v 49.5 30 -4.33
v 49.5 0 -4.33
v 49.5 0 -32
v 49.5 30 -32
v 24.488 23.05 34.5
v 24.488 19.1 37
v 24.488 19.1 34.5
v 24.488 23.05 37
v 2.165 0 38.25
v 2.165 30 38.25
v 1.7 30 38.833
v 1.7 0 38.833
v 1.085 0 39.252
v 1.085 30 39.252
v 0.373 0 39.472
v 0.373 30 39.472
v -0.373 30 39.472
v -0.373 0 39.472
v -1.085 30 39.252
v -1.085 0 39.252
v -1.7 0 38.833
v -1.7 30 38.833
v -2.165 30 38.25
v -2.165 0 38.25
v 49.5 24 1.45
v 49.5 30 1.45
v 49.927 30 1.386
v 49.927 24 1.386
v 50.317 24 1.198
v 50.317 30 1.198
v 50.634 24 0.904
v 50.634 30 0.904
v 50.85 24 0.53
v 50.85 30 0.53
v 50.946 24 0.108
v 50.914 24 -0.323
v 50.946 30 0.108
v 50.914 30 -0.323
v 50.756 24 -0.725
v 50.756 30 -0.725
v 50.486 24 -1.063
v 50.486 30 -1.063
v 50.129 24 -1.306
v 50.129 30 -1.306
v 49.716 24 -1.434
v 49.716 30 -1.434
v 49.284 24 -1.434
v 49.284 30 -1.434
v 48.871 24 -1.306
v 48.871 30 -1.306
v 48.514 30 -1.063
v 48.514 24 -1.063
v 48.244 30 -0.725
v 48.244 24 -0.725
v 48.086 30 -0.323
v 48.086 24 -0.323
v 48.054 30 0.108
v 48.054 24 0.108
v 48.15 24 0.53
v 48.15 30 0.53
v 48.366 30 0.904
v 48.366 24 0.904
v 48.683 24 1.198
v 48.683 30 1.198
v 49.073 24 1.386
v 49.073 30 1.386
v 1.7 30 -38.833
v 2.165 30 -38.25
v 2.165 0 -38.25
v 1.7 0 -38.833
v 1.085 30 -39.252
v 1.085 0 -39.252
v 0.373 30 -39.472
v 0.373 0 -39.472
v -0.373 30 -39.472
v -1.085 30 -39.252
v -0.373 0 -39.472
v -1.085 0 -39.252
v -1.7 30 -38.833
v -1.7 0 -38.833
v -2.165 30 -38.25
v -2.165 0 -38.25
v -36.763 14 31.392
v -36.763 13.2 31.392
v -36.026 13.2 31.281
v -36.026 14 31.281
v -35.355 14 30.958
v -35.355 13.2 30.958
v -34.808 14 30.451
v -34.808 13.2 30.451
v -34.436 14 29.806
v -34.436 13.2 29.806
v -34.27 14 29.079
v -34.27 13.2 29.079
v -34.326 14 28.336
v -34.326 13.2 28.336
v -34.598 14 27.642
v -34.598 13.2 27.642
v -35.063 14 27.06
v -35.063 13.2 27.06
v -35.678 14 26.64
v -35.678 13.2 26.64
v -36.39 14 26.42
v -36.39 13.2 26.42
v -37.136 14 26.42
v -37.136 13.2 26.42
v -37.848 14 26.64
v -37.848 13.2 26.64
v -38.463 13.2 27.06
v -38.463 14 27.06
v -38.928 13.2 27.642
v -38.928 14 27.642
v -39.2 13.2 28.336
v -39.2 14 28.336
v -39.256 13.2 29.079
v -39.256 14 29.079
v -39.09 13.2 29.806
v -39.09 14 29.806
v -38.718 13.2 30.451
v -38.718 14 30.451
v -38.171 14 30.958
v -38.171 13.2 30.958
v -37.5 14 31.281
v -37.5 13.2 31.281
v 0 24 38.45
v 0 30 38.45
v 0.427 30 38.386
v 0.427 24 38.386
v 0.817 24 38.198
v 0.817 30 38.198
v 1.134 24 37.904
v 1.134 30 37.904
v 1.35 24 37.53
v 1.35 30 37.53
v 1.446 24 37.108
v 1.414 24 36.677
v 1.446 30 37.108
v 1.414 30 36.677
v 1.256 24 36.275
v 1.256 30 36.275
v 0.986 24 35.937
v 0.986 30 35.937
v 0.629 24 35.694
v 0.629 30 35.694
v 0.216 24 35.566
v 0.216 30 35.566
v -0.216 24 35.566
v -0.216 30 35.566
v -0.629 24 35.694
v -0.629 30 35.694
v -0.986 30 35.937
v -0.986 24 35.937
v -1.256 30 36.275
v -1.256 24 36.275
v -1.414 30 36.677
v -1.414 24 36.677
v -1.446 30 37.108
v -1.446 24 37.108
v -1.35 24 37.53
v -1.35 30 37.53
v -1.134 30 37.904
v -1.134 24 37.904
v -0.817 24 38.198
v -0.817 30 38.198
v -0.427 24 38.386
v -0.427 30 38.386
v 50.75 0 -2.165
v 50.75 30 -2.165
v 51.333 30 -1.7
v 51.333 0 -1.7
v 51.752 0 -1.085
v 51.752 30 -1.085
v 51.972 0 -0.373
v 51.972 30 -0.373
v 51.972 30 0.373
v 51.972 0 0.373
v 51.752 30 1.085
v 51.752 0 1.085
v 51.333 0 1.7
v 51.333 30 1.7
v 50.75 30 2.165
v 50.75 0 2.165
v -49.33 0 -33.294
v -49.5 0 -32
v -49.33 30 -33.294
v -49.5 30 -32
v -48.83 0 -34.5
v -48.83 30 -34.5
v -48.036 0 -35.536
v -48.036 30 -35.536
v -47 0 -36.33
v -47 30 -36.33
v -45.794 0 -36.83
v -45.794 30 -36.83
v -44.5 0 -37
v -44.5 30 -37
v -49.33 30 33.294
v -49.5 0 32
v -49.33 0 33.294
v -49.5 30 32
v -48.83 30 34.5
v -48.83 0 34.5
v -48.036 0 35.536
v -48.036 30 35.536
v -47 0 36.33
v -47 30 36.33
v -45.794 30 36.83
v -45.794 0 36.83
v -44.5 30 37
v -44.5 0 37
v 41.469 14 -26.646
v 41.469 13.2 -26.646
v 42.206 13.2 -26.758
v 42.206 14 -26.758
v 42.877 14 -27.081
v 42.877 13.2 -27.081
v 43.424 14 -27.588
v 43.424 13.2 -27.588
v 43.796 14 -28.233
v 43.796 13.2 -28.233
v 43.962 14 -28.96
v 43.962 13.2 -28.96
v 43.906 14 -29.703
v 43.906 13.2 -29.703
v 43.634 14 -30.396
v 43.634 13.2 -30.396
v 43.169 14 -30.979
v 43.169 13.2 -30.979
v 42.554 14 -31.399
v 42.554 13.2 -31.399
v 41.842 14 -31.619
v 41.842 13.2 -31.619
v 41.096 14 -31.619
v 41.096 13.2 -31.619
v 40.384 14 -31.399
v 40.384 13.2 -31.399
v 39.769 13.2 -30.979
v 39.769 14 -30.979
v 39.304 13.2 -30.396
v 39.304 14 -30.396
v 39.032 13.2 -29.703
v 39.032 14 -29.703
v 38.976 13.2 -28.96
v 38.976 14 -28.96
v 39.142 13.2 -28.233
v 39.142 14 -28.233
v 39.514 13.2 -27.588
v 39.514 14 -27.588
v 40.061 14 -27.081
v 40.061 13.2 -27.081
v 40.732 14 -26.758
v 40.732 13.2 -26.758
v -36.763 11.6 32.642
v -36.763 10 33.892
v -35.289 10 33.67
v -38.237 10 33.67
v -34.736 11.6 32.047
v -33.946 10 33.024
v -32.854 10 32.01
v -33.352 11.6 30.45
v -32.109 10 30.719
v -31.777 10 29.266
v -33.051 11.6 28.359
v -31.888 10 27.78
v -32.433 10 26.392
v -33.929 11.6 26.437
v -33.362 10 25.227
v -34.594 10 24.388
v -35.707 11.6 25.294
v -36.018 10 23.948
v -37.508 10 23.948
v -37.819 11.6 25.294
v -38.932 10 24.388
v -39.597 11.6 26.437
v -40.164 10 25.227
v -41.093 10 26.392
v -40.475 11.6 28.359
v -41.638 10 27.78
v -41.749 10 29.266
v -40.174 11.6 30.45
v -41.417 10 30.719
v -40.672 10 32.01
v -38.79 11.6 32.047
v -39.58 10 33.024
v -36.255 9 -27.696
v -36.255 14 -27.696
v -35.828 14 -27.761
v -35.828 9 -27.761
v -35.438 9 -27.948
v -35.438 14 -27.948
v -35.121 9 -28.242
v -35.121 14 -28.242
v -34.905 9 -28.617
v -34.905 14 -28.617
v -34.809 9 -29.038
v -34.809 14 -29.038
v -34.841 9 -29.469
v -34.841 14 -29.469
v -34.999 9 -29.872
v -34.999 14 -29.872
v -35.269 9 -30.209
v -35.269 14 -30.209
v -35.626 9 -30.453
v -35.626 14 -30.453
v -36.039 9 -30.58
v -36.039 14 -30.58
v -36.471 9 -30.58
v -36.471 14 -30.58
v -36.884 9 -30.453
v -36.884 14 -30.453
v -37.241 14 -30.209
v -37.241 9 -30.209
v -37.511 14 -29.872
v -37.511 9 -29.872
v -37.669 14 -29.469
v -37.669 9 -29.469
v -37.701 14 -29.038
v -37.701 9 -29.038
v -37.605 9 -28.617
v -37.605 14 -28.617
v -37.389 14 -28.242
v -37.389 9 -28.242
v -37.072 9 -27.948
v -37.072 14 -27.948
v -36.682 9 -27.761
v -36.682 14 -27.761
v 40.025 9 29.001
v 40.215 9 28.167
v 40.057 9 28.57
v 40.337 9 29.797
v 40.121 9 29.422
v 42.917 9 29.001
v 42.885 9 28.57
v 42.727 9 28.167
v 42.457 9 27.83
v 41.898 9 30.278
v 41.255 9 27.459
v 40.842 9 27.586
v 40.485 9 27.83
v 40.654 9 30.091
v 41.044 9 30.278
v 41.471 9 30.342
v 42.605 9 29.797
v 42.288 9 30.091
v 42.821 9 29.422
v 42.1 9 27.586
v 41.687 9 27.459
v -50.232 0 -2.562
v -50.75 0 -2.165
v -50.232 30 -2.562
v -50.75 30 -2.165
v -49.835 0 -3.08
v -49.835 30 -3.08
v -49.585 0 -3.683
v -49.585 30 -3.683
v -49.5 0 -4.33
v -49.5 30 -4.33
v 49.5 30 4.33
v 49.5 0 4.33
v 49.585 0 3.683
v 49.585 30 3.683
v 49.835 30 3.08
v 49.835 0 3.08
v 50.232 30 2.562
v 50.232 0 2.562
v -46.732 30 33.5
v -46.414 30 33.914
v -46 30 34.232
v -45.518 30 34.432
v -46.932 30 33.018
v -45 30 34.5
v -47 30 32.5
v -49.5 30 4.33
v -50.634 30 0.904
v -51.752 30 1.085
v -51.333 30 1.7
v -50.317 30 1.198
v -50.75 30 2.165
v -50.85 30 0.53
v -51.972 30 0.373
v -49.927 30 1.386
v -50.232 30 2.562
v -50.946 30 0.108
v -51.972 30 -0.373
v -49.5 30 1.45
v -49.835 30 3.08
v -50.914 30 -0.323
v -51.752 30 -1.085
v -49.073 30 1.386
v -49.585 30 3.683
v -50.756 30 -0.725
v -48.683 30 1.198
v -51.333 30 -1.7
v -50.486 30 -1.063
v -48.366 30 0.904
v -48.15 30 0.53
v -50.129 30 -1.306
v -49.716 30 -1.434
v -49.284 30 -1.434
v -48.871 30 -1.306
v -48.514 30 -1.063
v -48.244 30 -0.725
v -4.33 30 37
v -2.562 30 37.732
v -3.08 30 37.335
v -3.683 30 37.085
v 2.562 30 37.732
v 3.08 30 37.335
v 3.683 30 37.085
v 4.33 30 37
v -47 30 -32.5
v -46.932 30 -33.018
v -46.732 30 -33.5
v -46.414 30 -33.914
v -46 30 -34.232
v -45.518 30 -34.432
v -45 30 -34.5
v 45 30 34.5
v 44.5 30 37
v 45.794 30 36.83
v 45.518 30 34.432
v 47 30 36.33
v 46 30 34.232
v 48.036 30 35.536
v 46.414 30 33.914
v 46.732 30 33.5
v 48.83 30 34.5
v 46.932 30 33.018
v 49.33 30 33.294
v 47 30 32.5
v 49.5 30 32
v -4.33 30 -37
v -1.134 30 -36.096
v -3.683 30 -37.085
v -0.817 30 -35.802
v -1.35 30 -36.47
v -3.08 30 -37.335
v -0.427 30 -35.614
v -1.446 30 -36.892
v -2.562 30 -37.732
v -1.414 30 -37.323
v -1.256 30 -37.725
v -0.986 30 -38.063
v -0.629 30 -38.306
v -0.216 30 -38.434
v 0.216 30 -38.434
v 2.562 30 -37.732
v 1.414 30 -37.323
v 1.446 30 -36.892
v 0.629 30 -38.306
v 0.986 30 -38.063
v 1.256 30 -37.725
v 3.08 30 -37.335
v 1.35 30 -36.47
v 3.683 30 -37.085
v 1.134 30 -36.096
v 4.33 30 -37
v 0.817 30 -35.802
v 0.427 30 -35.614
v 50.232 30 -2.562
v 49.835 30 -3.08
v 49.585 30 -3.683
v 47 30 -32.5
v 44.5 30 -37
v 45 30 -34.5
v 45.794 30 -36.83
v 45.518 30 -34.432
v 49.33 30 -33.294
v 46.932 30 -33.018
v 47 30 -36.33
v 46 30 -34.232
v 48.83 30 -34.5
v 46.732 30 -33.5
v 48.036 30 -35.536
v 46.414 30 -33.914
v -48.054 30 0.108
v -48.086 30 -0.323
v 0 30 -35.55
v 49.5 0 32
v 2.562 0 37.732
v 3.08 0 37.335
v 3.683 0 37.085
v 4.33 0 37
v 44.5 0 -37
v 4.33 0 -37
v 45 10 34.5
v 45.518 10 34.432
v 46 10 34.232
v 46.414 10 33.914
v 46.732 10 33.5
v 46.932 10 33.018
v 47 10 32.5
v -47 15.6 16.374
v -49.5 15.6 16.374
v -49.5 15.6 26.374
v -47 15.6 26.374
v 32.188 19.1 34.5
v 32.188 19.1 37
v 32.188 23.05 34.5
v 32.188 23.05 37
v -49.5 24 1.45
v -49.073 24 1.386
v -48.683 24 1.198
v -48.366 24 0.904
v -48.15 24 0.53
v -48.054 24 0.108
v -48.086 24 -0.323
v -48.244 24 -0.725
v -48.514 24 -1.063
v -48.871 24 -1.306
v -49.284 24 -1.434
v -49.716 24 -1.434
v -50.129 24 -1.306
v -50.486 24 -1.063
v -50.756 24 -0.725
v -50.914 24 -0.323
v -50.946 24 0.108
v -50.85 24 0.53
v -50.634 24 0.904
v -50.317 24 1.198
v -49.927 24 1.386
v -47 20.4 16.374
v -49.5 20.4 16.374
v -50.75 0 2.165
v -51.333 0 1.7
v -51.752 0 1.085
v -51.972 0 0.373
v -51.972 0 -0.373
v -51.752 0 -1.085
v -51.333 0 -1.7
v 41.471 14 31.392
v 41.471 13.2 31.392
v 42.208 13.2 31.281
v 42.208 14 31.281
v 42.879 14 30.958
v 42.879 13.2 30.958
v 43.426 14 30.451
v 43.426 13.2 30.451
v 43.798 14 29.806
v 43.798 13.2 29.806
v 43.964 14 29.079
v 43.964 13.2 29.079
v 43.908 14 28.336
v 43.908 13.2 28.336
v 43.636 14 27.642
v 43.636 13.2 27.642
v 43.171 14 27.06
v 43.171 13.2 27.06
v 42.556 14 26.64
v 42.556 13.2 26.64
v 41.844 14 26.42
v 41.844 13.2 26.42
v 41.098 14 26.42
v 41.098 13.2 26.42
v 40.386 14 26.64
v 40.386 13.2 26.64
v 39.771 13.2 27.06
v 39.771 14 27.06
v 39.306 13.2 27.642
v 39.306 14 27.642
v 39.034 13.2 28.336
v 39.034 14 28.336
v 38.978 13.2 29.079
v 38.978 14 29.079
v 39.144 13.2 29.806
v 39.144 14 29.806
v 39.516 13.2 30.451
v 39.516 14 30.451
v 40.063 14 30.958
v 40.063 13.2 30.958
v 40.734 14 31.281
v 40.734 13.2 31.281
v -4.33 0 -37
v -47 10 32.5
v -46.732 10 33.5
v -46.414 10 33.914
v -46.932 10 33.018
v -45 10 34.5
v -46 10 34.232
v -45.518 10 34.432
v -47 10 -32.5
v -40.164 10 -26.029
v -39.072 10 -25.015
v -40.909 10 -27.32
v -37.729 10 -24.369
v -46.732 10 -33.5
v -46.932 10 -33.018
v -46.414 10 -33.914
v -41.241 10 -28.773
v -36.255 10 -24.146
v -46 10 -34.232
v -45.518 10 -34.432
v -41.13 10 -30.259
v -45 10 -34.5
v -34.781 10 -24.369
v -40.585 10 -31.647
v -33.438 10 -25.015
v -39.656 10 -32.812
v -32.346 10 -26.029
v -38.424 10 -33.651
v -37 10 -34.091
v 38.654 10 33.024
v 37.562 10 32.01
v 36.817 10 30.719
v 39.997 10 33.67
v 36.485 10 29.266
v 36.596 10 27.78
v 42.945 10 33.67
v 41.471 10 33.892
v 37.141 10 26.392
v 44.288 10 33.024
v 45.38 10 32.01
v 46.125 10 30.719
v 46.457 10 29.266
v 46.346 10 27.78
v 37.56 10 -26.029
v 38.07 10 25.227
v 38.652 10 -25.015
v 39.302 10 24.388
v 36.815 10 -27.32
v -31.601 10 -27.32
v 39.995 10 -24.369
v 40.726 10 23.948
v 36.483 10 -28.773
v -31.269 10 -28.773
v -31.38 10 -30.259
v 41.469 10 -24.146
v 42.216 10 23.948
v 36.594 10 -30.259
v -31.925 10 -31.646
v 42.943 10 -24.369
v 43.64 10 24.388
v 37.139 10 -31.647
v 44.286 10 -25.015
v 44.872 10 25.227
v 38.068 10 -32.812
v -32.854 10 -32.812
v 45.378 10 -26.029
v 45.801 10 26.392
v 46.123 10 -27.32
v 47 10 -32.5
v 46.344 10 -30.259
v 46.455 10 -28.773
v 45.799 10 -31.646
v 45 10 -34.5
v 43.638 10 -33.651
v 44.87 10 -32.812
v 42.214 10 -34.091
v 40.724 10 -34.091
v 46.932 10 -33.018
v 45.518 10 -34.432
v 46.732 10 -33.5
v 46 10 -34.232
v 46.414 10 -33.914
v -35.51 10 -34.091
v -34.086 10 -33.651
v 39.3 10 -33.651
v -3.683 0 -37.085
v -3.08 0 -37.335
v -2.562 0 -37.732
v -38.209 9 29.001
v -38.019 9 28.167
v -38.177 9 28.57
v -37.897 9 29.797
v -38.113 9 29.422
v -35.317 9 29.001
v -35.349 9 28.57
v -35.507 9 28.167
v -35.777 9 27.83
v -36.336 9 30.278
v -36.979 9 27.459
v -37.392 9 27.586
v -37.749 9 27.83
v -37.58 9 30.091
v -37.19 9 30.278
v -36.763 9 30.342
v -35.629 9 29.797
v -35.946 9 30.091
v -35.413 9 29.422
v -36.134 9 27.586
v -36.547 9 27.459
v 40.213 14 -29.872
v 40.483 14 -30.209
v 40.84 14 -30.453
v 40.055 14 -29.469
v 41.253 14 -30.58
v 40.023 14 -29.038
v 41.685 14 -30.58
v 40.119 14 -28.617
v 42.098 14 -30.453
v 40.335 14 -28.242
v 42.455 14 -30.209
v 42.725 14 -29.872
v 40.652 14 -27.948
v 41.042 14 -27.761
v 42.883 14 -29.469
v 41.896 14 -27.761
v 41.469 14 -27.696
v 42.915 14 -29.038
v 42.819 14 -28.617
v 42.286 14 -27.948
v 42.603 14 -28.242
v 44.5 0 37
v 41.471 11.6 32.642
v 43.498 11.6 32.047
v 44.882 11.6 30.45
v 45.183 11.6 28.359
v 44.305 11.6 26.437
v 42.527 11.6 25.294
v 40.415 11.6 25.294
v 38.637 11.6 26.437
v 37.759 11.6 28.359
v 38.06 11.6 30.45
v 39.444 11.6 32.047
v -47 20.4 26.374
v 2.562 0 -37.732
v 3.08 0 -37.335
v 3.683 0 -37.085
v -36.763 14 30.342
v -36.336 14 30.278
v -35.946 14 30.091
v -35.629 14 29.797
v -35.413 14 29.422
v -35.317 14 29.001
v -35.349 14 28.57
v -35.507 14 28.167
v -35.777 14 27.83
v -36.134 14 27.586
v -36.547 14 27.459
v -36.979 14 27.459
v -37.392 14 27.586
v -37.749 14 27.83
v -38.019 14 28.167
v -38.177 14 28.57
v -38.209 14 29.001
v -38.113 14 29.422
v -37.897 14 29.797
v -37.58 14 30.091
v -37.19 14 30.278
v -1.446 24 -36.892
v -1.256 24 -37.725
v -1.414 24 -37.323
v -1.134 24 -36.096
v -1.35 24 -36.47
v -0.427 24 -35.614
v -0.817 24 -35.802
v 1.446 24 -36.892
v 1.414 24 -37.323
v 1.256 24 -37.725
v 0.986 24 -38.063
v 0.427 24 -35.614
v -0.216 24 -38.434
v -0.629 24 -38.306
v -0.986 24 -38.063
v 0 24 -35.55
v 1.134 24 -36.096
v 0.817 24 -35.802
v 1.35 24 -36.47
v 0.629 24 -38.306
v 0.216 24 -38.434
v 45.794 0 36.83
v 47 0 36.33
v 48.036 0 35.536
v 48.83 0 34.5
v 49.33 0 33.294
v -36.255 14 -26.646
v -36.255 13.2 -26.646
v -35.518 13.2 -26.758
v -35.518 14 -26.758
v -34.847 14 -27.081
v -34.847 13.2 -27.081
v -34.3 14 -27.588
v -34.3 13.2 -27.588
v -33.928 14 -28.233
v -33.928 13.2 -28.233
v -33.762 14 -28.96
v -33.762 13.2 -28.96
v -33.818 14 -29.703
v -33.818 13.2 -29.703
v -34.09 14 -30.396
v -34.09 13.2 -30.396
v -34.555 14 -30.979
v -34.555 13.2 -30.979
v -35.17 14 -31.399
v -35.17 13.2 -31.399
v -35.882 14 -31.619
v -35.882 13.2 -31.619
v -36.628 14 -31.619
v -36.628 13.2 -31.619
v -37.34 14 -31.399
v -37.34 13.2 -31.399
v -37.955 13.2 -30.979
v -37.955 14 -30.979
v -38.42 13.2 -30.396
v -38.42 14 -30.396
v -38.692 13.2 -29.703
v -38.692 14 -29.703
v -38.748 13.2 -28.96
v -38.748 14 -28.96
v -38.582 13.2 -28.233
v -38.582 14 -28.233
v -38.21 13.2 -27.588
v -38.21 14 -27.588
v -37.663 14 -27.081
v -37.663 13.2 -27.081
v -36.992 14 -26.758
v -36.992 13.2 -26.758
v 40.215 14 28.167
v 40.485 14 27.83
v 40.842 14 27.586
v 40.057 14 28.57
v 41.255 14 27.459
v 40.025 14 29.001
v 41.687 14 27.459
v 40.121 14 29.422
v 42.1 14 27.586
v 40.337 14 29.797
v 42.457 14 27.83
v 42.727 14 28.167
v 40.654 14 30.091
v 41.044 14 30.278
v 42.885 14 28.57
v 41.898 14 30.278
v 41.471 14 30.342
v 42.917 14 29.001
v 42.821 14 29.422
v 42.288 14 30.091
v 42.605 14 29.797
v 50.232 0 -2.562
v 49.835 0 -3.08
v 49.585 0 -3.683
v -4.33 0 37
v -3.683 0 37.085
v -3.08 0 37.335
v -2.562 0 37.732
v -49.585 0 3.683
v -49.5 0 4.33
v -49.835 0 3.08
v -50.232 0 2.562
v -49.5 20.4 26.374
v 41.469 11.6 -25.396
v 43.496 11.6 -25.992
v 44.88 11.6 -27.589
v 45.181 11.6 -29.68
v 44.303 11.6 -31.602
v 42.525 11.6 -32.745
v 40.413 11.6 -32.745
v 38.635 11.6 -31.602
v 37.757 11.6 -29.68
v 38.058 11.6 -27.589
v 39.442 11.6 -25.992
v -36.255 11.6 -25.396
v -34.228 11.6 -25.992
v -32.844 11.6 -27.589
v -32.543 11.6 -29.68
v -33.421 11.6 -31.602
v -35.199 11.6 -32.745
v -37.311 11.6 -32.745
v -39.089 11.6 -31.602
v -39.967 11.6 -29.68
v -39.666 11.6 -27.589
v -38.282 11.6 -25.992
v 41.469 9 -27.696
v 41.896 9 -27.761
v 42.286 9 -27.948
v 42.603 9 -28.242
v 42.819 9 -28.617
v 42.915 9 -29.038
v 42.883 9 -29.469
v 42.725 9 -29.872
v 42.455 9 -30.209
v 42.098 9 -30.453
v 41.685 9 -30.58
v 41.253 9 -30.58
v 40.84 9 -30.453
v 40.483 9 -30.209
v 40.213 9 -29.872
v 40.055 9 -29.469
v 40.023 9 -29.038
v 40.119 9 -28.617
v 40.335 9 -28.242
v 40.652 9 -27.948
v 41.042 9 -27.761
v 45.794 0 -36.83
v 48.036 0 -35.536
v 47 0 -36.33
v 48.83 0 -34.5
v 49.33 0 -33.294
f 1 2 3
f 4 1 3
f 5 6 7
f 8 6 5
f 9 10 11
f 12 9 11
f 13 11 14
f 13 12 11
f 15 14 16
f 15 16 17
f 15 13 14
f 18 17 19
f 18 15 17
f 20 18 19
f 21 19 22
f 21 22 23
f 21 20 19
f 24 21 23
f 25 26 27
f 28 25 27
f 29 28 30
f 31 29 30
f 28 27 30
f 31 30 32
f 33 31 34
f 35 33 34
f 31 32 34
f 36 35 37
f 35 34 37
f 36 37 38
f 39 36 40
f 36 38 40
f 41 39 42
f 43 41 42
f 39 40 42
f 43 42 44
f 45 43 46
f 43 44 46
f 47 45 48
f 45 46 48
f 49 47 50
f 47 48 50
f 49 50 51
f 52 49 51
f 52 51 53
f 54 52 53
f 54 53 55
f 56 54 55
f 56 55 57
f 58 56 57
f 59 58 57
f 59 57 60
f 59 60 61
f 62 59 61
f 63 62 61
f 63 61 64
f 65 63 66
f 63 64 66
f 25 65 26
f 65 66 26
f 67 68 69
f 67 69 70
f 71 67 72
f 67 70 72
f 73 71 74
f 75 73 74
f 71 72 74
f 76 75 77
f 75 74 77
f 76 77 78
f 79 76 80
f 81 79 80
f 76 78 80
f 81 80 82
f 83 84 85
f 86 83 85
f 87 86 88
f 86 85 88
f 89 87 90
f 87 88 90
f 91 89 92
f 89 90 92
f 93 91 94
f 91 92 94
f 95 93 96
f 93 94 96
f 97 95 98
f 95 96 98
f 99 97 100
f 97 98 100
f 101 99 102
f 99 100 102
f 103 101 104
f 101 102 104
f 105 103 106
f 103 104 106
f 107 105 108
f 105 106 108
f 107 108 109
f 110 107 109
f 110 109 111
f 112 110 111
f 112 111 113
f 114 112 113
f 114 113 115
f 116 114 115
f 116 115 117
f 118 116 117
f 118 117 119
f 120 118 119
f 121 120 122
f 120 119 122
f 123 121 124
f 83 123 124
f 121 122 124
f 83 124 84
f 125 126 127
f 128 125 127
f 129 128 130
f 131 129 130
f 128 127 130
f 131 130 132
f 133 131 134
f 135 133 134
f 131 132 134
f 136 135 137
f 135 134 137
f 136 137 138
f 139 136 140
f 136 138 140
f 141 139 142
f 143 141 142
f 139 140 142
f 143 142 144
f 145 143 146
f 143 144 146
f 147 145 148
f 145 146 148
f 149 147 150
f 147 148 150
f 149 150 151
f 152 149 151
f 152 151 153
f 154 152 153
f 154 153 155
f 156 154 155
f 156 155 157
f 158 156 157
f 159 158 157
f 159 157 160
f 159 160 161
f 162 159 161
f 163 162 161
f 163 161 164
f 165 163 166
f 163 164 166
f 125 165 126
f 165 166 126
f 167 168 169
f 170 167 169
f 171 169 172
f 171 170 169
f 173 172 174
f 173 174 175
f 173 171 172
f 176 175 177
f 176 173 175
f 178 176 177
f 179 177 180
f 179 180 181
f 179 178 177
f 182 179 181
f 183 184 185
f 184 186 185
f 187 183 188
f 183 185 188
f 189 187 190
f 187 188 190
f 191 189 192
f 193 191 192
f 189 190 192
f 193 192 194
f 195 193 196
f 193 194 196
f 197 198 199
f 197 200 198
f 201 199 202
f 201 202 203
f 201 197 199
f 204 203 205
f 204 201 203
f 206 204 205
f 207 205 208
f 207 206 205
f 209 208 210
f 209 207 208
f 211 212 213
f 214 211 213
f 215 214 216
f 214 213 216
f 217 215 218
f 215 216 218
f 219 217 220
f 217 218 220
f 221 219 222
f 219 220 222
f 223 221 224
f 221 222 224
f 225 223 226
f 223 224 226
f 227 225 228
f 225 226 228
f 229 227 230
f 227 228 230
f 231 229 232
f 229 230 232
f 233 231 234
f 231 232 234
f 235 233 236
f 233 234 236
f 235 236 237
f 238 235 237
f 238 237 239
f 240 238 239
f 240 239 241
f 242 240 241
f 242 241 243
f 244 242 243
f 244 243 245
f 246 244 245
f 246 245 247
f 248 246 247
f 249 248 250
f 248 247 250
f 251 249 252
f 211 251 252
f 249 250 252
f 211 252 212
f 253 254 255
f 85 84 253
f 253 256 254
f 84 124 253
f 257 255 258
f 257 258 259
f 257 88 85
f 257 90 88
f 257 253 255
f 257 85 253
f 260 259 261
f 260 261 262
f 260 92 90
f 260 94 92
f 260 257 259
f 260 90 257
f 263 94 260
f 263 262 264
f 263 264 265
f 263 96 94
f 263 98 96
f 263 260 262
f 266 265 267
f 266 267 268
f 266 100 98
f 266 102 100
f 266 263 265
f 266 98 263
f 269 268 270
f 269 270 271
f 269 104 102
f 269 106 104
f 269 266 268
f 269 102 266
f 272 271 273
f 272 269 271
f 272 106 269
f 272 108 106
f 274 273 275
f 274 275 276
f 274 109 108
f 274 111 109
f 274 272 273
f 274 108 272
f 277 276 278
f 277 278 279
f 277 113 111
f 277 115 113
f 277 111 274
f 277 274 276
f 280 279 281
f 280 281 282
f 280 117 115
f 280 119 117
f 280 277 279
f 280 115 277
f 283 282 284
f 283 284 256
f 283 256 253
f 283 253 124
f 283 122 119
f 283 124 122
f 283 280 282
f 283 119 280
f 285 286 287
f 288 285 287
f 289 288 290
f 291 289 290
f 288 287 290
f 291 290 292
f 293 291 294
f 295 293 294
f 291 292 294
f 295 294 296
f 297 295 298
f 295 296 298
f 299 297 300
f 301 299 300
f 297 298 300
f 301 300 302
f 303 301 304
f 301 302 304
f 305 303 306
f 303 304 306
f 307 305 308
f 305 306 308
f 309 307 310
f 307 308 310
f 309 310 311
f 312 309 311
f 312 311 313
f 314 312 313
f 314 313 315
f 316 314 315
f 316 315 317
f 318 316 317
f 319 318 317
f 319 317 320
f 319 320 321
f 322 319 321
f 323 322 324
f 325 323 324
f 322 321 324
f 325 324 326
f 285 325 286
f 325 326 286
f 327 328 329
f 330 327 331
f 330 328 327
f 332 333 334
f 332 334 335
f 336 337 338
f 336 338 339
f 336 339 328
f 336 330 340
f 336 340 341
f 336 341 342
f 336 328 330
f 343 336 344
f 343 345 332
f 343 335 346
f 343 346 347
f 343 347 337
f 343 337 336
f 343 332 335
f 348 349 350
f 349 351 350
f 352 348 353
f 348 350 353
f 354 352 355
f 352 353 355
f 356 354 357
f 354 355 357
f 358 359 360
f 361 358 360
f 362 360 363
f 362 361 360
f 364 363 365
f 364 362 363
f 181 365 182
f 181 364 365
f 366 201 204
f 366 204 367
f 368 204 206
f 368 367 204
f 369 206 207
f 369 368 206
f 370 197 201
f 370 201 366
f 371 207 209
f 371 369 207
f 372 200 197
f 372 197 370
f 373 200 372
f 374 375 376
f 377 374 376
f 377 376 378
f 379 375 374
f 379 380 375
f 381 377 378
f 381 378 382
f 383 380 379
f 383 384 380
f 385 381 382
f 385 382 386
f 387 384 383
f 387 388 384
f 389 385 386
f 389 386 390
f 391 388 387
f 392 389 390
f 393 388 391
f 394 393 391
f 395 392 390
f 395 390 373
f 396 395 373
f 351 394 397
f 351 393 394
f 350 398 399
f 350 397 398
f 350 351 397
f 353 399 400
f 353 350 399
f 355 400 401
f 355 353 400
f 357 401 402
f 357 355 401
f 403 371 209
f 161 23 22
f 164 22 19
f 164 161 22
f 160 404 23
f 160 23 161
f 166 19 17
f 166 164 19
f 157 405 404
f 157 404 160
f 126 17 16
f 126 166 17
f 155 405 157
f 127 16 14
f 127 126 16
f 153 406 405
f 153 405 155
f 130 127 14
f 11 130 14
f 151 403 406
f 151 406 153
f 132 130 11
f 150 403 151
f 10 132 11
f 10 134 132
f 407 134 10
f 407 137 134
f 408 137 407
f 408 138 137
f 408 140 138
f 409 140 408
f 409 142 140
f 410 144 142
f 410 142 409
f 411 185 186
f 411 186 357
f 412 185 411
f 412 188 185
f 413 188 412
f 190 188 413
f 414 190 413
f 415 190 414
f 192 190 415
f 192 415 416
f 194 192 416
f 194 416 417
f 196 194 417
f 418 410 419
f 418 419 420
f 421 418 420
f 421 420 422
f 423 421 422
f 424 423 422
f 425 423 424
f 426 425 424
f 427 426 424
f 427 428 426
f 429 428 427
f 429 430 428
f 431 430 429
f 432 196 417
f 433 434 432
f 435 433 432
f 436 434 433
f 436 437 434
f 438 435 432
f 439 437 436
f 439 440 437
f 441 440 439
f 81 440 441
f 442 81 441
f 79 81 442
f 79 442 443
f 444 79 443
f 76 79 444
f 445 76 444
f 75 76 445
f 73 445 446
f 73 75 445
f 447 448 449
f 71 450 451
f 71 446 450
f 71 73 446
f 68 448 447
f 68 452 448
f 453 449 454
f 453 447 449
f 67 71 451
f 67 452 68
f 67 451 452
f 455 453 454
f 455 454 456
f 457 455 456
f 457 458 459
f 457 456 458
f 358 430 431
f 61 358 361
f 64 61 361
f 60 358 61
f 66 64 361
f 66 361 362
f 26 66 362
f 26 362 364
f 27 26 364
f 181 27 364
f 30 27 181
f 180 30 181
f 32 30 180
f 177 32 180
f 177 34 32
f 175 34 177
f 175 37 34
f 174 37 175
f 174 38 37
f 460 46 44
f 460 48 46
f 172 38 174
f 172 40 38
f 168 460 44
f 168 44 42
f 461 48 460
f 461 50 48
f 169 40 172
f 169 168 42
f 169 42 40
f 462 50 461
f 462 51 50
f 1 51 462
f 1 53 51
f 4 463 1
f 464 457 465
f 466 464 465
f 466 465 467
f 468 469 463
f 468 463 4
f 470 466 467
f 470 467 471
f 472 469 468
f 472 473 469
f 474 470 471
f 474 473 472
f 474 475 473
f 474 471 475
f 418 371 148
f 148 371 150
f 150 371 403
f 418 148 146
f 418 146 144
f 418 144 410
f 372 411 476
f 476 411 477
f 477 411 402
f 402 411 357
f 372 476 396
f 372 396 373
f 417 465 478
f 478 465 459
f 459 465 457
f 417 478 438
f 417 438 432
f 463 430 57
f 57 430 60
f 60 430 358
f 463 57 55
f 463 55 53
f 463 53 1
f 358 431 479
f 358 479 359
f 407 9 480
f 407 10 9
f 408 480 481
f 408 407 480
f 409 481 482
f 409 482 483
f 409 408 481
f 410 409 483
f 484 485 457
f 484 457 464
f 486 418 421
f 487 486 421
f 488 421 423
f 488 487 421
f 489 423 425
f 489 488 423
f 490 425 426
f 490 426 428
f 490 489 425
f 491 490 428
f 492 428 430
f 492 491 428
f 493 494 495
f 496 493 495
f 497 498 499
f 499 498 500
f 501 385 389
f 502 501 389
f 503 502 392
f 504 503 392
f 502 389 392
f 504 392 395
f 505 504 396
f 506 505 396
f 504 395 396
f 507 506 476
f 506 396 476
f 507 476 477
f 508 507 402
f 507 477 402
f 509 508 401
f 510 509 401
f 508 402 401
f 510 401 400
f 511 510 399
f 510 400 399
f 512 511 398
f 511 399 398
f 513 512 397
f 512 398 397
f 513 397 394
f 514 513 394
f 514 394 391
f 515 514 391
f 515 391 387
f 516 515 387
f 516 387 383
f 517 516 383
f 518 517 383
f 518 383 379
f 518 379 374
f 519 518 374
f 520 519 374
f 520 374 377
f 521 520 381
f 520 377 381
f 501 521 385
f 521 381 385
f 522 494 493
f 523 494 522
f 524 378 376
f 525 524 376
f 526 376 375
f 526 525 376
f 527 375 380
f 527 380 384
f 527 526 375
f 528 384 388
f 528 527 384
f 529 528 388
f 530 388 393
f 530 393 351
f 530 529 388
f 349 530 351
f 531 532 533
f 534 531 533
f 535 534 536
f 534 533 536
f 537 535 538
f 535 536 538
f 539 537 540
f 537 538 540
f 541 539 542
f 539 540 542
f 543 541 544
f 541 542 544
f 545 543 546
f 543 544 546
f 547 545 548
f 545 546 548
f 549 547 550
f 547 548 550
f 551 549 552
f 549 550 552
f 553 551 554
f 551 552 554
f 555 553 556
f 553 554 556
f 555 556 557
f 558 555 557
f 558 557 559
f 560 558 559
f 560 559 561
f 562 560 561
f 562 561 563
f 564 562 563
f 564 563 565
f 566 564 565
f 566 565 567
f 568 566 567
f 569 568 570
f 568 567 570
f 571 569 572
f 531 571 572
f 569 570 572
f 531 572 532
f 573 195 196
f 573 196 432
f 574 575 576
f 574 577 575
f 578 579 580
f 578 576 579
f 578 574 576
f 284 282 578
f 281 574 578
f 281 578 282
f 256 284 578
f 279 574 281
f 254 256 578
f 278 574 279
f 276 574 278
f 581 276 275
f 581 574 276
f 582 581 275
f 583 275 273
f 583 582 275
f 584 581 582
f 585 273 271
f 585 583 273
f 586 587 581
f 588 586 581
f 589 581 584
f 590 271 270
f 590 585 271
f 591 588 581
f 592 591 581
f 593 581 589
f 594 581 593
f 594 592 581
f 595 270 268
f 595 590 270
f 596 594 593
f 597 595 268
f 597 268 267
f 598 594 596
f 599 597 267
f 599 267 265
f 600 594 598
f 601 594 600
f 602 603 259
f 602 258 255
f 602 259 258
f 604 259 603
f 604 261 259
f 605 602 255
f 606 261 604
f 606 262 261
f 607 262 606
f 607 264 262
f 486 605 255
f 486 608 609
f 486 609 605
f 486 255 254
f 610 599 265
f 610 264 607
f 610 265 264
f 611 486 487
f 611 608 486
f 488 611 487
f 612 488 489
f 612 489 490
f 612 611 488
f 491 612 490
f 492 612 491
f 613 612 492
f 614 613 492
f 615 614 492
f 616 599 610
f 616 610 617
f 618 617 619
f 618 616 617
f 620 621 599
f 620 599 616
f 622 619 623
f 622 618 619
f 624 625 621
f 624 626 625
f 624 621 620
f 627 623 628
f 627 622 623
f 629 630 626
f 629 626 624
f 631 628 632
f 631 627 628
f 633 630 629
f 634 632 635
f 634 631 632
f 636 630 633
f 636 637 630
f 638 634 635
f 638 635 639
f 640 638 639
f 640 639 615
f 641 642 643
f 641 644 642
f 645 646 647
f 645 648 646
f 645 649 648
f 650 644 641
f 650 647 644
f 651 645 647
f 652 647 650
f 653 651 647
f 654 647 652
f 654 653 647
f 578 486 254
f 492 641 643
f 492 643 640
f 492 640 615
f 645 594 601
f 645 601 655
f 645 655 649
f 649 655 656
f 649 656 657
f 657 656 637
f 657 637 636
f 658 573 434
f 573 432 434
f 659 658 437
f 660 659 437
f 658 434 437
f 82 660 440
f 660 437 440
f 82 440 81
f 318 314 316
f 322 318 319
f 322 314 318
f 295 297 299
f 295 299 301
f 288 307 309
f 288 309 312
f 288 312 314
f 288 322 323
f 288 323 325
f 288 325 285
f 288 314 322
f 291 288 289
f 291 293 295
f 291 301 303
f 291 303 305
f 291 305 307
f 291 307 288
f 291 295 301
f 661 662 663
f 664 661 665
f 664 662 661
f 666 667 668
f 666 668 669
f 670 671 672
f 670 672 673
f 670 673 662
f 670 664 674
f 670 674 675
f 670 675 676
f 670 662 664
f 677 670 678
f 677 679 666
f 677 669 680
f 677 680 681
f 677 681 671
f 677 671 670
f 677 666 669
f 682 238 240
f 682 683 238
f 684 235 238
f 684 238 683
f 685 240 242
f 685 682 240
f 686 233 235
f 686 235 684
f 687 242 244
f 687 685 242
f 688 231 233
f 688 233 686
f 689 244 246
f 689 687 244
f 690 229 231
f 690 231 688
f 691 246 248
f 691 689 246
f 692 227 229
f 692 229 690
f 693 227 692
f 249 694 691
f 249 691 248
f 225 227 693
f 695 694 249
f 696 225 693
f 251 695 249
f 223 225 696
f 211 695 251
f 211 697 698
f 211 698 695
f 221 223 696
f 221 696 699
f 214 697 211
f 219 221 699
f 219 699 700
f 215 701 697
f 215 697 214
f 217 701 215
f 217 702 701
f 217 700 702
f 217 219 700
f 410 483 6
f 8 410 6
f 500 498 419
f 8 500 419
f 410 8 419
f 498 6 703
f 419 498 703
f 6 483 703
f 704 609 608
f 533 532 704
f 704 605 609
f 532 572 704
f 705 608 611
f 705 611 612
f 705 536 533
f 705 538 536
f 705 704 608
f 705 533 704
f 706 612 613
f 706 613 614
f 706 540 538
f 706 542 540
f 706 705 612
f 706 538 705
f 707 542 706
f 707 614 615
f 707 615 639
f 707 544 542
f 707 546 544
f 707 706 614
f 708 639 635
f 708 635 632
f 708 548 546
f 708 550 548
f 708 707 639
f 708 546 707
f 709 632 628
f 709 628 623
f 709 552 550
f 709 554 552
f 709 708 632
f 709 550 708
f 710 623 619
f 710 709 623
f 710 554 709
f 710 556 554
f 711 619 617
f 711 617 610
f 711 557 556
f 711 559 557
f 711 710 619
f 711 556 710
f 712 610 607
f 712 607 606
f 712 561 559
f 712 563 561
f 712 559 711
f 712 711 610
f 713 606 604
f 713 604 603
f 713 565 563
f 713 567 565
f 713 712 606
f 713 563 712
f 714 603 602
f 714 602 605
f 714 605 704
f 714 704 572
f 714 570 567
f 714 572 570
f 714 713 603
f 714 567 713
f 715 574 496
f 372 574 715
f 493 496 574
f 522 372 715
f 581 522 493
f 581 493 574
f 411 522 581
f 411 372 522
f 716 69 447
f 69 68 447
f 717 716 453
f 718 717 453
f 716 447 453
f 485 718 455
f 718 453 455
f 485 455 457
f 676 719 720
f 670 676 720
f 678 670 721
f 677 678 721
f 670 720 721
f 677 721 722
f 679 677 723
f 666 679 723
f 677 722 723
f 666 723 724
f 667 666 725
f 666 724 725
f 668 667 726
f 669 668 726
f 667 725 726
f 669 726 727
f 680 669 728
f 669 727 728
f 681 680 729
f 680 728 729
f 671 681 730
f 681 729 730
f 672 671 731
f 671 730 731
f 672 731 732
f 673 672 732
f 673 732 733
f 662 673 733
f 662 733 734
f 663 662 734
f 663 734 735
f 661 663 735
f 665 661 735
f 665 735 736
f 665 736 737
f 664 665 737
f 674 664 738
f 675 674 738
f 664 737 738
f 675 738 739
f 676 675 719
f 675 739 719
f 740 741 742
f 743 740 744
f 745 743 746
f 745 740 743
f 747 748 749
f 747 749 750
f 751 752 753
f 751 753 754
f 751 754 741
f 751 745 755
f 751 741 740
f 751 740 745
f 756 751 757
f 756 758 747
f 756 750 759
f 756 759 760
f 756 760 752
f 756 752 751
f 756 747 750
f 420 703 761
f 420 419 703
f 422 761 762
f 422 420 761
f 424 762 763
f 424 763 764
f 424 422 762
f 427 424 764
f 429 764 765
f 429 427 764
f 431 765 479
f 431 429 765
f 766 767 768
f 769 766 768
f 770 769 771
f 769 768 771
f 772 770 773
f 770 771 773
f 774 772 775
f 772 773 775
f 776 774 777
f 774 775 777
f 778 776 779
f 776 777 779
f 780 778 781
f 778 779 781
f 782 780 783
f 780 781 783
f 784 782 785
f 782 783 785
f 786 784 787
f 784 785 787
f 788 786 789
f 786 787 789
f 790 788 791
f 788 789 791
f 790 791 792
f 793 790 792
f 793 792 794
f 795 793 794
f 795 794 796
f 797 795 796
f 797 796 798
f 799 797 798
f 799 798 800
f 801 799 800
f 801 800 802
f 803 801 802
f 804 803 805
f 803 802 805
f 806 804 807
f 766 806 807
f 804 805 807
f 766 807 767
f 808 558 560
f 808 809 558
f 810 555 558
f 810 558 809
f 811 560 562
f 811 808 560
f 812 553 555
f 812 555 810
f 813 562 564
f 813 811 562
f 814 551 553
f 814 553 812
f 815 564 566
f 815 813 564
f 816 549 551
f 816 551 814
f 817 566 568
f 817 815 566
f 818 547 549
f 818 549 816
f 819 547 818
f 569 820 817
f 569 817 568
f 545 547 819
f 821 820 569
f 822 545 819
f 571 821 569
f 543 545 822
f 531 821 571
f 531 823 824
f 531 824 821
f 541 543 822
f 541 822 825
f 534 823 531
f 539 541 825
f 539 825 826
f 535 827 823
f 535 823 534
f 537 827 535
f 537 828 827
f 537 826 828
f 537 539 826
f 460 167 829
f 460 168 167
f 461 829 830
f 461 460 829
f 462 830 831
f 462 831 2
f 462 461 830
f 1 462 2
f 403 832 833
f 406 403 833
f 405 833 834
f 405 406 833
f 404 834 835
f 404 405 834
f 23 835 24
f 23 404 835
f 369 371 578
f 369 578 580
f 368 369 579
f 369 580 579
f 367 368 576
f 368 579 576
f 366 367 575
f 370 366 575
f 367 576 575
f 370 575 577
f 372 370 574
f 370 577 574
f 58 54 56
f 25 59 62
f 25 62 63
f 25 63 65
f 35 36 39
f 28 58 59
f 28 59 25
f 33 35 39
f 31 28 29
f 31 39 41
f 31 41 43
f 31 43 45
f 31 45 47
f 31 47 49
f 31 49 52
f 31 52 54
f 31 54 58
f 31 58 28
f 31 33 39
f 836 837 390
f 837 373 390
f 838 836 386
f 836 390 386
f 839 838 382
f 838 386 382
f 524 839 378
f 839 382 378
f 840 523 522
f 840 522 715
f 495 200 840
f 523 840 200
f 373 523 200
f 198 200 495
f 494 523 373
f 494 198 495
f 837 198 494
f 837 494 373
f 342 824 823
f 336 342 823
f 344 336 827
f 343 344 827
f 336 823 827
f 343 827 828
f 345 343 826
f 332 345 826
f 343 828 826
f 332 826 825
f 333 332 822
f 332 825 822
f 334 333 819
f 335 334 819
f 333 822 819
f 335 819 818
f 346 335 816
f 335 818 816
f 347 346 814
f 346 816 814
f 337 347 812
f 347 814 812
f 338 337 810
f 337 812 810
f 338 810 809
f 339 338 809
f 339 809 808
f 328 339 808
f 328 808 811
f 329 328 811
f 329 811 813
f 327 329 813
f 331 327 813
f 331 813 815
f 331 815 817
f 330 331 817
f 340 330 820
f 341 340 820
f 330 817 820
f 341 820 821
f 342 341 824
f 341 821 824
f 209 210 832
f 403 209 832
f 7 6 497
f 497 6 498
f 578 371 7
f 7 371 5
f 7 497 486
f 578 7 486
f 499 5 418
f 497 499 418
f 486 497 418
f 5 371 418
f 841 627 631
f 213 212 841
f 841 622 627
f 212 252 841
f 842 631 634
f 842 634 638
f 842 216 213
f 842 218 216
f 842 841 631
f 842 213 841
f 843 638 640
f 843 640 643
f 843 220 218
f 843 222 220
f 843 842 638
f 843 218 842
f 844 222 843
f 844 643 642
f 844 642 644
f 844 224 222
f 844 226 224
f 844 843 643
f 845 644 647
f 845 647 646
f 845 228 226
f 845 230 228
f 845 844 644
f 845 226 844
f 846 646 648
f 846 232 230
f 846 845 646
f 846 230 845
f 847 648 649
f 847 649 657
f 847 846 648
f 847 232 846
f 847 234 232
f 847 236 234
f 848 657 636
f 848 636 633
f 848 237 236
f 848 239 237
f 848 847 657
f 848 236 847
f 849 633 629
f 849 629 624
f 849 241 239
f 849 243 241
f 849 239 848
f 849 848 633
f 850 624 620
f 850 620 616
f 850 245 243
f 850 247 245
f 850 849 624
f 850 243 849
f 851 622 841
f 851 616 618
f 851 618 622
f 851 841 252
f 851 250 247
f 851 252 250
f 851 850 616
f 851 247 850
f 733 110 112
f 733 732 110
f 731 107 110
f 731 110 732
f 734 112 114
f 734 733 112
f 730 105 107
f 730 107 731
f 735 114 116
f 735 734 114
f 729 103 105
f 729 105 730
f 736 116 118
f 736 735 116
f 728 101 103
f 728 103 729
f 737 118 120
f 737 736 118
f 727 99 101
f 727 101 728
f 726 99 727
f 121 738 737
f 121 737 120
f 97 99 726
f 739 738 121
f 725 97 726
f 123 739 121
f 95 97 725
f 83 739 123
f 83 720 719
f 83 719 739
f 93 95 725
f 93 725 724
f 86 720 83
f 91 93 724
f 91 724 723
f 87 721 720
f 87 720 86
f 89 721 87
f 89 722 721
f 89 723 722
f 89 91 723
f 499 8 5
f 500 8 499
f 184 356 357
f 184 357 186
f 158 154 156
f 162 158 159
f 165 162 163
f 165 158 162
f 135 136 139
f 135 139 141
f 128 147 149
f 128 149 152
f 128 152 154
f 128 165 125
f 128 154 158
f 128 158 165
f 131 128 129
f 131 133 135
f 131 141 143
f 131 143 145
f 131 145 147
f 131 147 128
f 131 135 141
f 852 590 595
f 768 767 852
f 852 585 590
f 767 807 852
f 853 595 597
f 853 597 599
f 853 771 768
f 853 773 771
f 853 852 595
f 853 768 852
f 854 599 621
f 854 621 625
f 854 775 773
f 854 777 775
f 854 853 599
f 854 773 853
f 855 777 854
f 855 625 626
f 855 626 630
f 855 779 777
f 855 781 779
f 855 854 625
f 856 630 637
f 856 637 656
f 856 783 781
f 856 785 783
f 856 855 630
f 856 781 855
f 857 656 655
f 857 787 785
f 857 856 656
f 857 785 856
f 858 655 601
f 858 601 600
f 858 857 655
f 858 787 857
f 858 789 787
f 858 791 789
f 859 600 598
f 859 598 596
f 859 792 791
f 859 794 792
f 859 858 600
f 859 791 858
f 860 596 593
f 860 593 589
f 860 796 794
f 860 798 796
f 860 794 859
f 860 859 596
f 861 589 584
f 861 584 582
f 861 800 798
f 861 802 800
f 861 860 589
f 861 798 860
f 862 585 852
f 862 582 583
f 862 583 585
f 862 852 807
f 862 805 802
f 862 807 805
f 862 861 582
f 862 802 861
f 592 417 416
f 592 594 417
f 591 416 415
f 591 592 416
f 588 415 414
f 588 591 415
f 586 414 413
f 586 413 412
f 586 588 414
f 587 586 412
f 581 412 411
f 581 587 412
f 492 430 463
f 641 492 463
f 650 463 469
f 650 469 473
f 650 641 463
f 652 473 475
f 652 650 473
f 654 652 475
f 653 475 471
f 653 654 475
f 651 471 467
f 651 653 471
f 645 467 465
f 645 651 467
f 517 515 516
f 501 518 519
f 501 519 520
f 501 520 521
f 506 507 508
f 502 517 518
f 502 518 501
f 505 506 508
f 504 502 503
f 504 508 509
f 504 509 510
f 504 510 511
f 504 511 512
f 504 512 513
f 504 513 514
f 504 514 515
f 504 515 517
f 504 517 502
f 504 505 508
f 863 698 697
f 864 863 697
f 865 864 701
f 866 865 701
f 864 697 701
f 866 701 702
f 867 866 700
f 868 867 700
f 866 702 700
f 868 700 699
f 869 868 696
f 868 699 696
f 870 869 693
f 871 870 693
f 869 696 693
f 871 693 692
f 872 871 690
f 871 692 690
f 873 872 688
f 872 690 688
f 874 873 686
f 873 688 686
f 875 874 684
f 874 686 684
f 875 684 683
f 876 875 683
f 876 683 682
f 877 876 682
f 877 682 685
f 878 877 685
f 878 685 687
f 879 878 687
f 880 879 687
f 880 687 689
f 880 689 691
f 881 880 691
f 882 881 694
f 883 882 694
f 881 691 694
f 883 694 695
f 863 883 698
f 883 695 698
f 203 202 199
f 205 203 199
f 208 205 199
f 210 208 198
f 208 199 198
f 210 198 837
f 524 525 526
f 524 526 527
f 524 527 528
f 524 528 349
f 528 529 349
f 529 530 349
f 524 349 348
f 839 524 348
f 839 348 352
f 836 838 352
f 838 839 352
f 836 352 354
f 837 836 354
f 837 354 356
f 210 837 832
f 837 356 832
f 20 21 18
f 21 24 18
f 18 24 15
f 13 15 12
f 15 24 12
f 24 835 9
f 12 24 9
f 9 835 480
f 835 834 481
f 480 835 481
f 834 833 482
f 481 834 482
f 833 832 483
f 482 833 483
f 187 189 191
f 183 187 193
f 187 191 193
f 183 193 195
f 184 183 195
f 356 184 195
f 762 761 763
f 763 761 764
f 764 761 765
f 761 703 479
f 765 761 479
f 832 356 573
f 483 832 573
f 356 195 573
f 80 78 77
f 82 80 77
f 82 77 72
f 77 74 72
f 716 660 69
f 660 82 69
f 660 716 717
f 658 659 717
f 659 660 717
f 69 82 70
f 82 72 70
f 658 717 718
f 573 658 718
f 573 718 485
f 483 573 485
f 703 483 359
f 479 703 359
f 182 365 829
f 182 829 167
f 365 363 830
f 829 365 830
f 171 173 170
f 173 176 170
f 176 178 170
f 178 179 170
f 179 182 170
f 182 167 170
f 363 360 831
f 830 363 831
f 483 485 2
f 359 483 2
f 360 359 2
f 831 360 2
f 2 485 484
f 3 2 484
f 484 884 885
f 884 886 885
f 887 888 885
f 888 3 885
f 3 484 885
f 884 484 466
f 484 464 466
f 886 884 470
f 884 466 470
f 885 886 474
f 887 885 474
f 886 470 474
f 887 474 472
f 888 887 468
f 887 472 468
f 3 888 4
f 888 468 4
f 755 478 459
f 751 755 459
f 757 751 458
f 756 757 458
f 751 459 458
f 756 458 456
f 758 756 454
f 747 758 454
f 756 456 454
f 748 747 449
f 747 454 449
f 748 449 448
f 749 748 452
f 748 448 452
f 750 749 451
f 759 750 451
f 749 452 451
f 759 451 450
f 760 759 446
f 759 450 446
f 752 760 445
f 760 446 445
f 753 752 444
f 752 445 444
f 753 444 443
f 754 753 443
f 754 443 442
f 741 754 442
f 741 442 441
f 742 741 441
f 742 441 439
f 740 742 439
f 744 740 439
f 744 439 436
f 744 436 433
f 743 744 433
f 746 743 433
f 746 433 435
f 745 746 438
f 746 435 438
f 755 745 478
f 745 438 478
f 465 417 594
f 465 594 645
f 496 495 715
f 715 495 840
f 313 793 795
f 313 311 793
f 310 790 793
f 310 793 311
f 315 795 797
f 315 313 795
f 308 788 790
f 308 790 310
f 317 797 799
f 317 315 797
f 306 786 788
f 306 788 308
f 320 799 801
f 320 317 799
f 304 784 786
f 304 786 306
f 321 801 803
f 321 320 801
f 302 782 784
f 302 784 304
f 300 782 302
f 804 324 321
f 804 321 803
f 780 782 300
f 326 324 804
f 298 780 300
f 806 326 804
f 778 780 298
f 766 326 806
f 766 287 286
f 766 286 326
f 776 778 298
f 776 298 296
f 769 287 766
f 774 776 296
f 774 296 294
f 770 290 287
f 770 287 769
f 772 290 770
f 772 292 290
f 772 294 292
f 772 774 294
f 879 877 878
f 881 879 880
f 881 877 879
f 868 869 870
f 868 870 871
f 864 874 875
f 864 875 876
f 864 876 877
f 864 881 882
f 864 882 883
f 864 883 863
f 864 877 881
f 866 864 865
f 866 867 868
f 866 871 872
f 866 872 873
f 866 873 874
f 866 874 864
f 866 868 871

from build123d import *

# Parameters (mm, degrees)
SKETCH1_W           = 99
SKETCH1_H           = 74
BOSS_EXTRUDE1_DEPTH = 30
SKETCH2_W           = 94
SKETCH2_H           = 69
CUT_EXTRUDE1_DEPTH  = 20
FILLET2_R           = 5
FILLET3_R           = 2
SKETCH3_R           = 2.5
BOSS_EXTRUDE2_DEPTH = 4
SKETCH8_R           = 1.45
CUT_EXTRUDE4_DEPTH  = 5
CHAMFER1_SIZE       = 2.5
CHAMFER1_SIZE2      = 3.19985408
CHAMFER2_SIZE       = 2.5
CHAMFER2_SIZE2      = 3.19985408
CHAMFER3_SIZE       = 2.5
CHAMFER3_SIZE2      = 3.19985408
CHAMFER4_SIZE       = 2.5
CHAMFER4_SIZE2      = 3.19985408
BOSS_EXTRUDE3_DEPTH = 30
SKETCH11_R          = 1.45
CUT_EXTRUDE5_DEPTH  = 6
FILLET5_R           = 2.5
SKETCH13_W          = 10
SKETCH13_H          = 4.8
CUT_EXTRUDE7_DEPTH  = 2.5
SKETCH14_W          = 7.6999997
SKETCH14_H          = 3.94999985
CUT_EXTRUDE8_DEPTH  = 2.5


with BuildPart() as part:
    # Sketch1 → Boss-Extrude1 (new body)
    with BuildSketch(Plane(origin=(0, 0, 0), x_dir=(1, 0, 0), z_dir=(0, 1, 0))):
        Rectangle(SKETCH1_W, SKETCH1_H)
    extrude(amount=BOSS_EXTRUDE1_DEPTH)

    # Sketch2 → Cut-Extrude1 (cut)
    with BuildSketch(Plane(origin=(0, 30, 0), x_dir=(1, 0, 0), z_dir=(0, 1, 0))):
        Rectangle(SKETCH2_W, SKETCH2_H)
    extrude(amount=-CUT_EXTRUDE1_DEPTH, mode=Mode.SUBTRACT)

    # Fillet2
    fillet2_edges = [part.edges().sort_by_distance(p)[0] for p in [
        (49.5, 15, 37),
        (-49.5, 15, 37),
        (-49.5, 15, -37),
        (49.5, 15, -37),
    ]]
    fillet(fillet2_edges, radius=FILLET2_R)

    # Fillet3
    fillet3_edges = [part.edges().sort_by_distance(p)[0] for p in [
        (47, 20, -34.5),
        (47, 20, 34.5),
        (-47, 20, 34.5),
        (-47, 20, -34.5),
    ]]
    fillet(fillet3_edges, radius=FILLET3_R)

    # Sketch3 → Boss-Extrude2 (add)
    with BuildSketch(Plane(origin=(0, 10, 0), x_dir=(1, 0, 0), z_dir=(0, 1, 0))):
        with Locations(Location((-36.255, 29.1465, 0), (0, 0, 270))):
            Circle(SKETCH3_R)
        with Locations(Location((41.469, 29.1465, 0), (0, 0, 270))):
            Circle(SKETCH3_R)
        with Locations(Location((41.471, -28.8925, 0), (0, 0, 270))):
            Circle(SKETCH3_R)
        with Locations(Location((-36.763, -28.8925, 0), (0, 0, 270))):
            Circle(SKETCH3_R)
    extrude(amount=BOSS_EXTRUDE2_DEPTH)

    # Sketch8 → Cut-Extrude4 (cut)
    with BuildSketch(Plane(origin=(0, 14, 0), x_dir=(1, 0, 0), z_dir=(0, 1, 0))):
        with Locations(Location((-36.255, 29.1465, 0), (0, 0, 270))):
            Circle(SKETCH8_R)
        with Locations(Location((-36.763, -28.8925, 0), (0, 0, 270))):
            Circle(SKETCH8_R)
        with Locations(Location((41.469, 29.1465, 0), (0, 0, 270))):
            Circle(SKETCH8_R)
        with Locations(Location((41.471, -28.8925, 0), (0, 0, 270))):
            Circle(SKETCH8_R)
    extrude(amount=-CUT_EXTRUDE4_DEPTH, mode=Mode.SUBTRACT)

    # Chamfer1
    chamfer1_edges = [part.edges().sort_by_distance(p)[0] for p in [
        (-36.763, 10, 26.3925),
    ]]
    chamfer1_side = [part.faces().sort_by_distance(p)[0] for p in [
        (-0.030421175, 10, 0.001557545),
    ]]
    chamfer(chamfer1_edges, length=CHAMFER1_SIZE, length2=CHAMFER1_SIZE2, reference=chamfer1_side[0])

    # Chamfer2
    chamfer2_edges = [part.edges().sort_by_distance(p)[0] for p in [
        (41.471, 10, 26.3925),
    ]]
    chamfer2_side = [part.faces().sort_by_distance(p)[0] for p in [
        (0.310585286, 10, -0.266651178),
    ]]
    chamfer(chamfer2_edges, length=CHAMFER2_SIZE, length2=CHAMFER2_SIZE2, reference=chamfer2_side[0])

    # Chamfer3
    chamfer3_edges = [part.edges().sort_by_distance(p)[0] for p in [
        (-36.255, 10, -31.6465),
    ]]
    chamfer3_side = [part.faces().sort_by_distance(p)[0] for p in [
        (-0.075107512, 10, -0.53988639),
    ]]
    chamfer(chamfer3_edges, length=CHAMFER3_SIZE, length2=CHAMFER3_SIZE2, reference=chamfer3_side[0])

    # Chamfer4
    chamfer4_edges = [part.edges().sort_by_distance(p)[0] for p in [
        (41.469, 10, -31.6465),
    ]]
    chamfer4_side = [part.faces().sort_by_distance(p)[0] for p in [
        (0.267122265, 10, -0.269293132),
    ]]
    chamfer(chamfer4_edges, length=CHAMFER4_SIZE, length2=CHAMFER4_SIZE2, reference=chamfer4_side[0])

    # Sketch10 → Boss-Extrude3 (add)
    with BuildSketch(Plane.XZ):
        with BuildLine():
            Line((-2.5, 37), (2.5, 37))
            ThreePointArc((2.5, 37), (0, 39.5), (-2.5, 37))
        make_face()
        with BuildLine():
            Line((-49.5, -2.5), (-49.5, 2.5))
            ThreePointArc((-49.5, 2.5), (-52, 0), (-49.5, -2.5))
        make_face()
        with BuildLine():
            Line((-2.5, -37), (2.5, -37))
            ThreePointArc((2.5, -37), (0, -39.5), (-2.5, -37))
        make_face()
        with BuildLine():
            Line((49.5, 2.5), (49.5, -2.5))
            ThreePointArc((49.5, -2.5), (52, 0), (49.5, 2.5))
        make_face()
    extrude(amount=-BOSS_EXTRUDE3_DEPTH)

    # Sketch11 → Cut-Extrude5 (cut)
    with BuildSketch(Plane(origin=(0, 30, 0), x_dir=(1, 0, 0), z_dir=(0, 1, 0))):
        with Locations(Location((0, 37, 0), (0, 0, 270))):
            Circle(SKETCH11_R)
        with Locations(Location((-49.5, 0, 0), (0, 0, 270))):
            Circle(SKETCH11_R)
        with Locations(Location((0, -37, 0), (0, 0, 270))):
            Circle(SKETCH11_R)
        with Locations(Location((49.5, 0, 0), (0, 0, 270))):
            Circle(SKETCH11_R)
    extrude(amount=-CUT_EXTRUDE5_DEPTH, mode=Mode.SUBTRACT)

    # Fillet5
    fillet5_edges = [part.edges().sort_by_distance(p)[0] for p in [
        (2.5, 15, 37),
        (-2.5, 15, 37),
        (-2.5, 15, -37),
        (2.5, 15, -37),
        (-49.5, 15, 2.5),
        (-49.5, 15, -2.5),
        (49.5, 15, -2.5),
        (49.5, 15, 2.5),
    ]]
    fillet(fillet5_edges, radius=FILLET5_R)

    # Sketch13 → Cut-Extrude7 (cut)
    with BuildSketch(Plane.ZY.offset(49.5)):
        with Locations((21.37405504, 18)):
            Rectangle(SKETCH13_W, SKETCH13_H)
    extrude(amount=-CUT_EXTRUDE7_DEPTH, mode=Mode.SUBTRACT)

    # Sketch14 → Cut-Extrude8 (cut)
    with BuildSketch(Plane.XY.offset(37)):
        with Locations((28.33814532, 21.075027895)):
            Rectangle(SKETCH14_W, SKETCH14_H)
    extrude(amount=-CUT_EXTRUDE8_DEPTH, mode=Mode.SUBTRACT)


solid = part.part
